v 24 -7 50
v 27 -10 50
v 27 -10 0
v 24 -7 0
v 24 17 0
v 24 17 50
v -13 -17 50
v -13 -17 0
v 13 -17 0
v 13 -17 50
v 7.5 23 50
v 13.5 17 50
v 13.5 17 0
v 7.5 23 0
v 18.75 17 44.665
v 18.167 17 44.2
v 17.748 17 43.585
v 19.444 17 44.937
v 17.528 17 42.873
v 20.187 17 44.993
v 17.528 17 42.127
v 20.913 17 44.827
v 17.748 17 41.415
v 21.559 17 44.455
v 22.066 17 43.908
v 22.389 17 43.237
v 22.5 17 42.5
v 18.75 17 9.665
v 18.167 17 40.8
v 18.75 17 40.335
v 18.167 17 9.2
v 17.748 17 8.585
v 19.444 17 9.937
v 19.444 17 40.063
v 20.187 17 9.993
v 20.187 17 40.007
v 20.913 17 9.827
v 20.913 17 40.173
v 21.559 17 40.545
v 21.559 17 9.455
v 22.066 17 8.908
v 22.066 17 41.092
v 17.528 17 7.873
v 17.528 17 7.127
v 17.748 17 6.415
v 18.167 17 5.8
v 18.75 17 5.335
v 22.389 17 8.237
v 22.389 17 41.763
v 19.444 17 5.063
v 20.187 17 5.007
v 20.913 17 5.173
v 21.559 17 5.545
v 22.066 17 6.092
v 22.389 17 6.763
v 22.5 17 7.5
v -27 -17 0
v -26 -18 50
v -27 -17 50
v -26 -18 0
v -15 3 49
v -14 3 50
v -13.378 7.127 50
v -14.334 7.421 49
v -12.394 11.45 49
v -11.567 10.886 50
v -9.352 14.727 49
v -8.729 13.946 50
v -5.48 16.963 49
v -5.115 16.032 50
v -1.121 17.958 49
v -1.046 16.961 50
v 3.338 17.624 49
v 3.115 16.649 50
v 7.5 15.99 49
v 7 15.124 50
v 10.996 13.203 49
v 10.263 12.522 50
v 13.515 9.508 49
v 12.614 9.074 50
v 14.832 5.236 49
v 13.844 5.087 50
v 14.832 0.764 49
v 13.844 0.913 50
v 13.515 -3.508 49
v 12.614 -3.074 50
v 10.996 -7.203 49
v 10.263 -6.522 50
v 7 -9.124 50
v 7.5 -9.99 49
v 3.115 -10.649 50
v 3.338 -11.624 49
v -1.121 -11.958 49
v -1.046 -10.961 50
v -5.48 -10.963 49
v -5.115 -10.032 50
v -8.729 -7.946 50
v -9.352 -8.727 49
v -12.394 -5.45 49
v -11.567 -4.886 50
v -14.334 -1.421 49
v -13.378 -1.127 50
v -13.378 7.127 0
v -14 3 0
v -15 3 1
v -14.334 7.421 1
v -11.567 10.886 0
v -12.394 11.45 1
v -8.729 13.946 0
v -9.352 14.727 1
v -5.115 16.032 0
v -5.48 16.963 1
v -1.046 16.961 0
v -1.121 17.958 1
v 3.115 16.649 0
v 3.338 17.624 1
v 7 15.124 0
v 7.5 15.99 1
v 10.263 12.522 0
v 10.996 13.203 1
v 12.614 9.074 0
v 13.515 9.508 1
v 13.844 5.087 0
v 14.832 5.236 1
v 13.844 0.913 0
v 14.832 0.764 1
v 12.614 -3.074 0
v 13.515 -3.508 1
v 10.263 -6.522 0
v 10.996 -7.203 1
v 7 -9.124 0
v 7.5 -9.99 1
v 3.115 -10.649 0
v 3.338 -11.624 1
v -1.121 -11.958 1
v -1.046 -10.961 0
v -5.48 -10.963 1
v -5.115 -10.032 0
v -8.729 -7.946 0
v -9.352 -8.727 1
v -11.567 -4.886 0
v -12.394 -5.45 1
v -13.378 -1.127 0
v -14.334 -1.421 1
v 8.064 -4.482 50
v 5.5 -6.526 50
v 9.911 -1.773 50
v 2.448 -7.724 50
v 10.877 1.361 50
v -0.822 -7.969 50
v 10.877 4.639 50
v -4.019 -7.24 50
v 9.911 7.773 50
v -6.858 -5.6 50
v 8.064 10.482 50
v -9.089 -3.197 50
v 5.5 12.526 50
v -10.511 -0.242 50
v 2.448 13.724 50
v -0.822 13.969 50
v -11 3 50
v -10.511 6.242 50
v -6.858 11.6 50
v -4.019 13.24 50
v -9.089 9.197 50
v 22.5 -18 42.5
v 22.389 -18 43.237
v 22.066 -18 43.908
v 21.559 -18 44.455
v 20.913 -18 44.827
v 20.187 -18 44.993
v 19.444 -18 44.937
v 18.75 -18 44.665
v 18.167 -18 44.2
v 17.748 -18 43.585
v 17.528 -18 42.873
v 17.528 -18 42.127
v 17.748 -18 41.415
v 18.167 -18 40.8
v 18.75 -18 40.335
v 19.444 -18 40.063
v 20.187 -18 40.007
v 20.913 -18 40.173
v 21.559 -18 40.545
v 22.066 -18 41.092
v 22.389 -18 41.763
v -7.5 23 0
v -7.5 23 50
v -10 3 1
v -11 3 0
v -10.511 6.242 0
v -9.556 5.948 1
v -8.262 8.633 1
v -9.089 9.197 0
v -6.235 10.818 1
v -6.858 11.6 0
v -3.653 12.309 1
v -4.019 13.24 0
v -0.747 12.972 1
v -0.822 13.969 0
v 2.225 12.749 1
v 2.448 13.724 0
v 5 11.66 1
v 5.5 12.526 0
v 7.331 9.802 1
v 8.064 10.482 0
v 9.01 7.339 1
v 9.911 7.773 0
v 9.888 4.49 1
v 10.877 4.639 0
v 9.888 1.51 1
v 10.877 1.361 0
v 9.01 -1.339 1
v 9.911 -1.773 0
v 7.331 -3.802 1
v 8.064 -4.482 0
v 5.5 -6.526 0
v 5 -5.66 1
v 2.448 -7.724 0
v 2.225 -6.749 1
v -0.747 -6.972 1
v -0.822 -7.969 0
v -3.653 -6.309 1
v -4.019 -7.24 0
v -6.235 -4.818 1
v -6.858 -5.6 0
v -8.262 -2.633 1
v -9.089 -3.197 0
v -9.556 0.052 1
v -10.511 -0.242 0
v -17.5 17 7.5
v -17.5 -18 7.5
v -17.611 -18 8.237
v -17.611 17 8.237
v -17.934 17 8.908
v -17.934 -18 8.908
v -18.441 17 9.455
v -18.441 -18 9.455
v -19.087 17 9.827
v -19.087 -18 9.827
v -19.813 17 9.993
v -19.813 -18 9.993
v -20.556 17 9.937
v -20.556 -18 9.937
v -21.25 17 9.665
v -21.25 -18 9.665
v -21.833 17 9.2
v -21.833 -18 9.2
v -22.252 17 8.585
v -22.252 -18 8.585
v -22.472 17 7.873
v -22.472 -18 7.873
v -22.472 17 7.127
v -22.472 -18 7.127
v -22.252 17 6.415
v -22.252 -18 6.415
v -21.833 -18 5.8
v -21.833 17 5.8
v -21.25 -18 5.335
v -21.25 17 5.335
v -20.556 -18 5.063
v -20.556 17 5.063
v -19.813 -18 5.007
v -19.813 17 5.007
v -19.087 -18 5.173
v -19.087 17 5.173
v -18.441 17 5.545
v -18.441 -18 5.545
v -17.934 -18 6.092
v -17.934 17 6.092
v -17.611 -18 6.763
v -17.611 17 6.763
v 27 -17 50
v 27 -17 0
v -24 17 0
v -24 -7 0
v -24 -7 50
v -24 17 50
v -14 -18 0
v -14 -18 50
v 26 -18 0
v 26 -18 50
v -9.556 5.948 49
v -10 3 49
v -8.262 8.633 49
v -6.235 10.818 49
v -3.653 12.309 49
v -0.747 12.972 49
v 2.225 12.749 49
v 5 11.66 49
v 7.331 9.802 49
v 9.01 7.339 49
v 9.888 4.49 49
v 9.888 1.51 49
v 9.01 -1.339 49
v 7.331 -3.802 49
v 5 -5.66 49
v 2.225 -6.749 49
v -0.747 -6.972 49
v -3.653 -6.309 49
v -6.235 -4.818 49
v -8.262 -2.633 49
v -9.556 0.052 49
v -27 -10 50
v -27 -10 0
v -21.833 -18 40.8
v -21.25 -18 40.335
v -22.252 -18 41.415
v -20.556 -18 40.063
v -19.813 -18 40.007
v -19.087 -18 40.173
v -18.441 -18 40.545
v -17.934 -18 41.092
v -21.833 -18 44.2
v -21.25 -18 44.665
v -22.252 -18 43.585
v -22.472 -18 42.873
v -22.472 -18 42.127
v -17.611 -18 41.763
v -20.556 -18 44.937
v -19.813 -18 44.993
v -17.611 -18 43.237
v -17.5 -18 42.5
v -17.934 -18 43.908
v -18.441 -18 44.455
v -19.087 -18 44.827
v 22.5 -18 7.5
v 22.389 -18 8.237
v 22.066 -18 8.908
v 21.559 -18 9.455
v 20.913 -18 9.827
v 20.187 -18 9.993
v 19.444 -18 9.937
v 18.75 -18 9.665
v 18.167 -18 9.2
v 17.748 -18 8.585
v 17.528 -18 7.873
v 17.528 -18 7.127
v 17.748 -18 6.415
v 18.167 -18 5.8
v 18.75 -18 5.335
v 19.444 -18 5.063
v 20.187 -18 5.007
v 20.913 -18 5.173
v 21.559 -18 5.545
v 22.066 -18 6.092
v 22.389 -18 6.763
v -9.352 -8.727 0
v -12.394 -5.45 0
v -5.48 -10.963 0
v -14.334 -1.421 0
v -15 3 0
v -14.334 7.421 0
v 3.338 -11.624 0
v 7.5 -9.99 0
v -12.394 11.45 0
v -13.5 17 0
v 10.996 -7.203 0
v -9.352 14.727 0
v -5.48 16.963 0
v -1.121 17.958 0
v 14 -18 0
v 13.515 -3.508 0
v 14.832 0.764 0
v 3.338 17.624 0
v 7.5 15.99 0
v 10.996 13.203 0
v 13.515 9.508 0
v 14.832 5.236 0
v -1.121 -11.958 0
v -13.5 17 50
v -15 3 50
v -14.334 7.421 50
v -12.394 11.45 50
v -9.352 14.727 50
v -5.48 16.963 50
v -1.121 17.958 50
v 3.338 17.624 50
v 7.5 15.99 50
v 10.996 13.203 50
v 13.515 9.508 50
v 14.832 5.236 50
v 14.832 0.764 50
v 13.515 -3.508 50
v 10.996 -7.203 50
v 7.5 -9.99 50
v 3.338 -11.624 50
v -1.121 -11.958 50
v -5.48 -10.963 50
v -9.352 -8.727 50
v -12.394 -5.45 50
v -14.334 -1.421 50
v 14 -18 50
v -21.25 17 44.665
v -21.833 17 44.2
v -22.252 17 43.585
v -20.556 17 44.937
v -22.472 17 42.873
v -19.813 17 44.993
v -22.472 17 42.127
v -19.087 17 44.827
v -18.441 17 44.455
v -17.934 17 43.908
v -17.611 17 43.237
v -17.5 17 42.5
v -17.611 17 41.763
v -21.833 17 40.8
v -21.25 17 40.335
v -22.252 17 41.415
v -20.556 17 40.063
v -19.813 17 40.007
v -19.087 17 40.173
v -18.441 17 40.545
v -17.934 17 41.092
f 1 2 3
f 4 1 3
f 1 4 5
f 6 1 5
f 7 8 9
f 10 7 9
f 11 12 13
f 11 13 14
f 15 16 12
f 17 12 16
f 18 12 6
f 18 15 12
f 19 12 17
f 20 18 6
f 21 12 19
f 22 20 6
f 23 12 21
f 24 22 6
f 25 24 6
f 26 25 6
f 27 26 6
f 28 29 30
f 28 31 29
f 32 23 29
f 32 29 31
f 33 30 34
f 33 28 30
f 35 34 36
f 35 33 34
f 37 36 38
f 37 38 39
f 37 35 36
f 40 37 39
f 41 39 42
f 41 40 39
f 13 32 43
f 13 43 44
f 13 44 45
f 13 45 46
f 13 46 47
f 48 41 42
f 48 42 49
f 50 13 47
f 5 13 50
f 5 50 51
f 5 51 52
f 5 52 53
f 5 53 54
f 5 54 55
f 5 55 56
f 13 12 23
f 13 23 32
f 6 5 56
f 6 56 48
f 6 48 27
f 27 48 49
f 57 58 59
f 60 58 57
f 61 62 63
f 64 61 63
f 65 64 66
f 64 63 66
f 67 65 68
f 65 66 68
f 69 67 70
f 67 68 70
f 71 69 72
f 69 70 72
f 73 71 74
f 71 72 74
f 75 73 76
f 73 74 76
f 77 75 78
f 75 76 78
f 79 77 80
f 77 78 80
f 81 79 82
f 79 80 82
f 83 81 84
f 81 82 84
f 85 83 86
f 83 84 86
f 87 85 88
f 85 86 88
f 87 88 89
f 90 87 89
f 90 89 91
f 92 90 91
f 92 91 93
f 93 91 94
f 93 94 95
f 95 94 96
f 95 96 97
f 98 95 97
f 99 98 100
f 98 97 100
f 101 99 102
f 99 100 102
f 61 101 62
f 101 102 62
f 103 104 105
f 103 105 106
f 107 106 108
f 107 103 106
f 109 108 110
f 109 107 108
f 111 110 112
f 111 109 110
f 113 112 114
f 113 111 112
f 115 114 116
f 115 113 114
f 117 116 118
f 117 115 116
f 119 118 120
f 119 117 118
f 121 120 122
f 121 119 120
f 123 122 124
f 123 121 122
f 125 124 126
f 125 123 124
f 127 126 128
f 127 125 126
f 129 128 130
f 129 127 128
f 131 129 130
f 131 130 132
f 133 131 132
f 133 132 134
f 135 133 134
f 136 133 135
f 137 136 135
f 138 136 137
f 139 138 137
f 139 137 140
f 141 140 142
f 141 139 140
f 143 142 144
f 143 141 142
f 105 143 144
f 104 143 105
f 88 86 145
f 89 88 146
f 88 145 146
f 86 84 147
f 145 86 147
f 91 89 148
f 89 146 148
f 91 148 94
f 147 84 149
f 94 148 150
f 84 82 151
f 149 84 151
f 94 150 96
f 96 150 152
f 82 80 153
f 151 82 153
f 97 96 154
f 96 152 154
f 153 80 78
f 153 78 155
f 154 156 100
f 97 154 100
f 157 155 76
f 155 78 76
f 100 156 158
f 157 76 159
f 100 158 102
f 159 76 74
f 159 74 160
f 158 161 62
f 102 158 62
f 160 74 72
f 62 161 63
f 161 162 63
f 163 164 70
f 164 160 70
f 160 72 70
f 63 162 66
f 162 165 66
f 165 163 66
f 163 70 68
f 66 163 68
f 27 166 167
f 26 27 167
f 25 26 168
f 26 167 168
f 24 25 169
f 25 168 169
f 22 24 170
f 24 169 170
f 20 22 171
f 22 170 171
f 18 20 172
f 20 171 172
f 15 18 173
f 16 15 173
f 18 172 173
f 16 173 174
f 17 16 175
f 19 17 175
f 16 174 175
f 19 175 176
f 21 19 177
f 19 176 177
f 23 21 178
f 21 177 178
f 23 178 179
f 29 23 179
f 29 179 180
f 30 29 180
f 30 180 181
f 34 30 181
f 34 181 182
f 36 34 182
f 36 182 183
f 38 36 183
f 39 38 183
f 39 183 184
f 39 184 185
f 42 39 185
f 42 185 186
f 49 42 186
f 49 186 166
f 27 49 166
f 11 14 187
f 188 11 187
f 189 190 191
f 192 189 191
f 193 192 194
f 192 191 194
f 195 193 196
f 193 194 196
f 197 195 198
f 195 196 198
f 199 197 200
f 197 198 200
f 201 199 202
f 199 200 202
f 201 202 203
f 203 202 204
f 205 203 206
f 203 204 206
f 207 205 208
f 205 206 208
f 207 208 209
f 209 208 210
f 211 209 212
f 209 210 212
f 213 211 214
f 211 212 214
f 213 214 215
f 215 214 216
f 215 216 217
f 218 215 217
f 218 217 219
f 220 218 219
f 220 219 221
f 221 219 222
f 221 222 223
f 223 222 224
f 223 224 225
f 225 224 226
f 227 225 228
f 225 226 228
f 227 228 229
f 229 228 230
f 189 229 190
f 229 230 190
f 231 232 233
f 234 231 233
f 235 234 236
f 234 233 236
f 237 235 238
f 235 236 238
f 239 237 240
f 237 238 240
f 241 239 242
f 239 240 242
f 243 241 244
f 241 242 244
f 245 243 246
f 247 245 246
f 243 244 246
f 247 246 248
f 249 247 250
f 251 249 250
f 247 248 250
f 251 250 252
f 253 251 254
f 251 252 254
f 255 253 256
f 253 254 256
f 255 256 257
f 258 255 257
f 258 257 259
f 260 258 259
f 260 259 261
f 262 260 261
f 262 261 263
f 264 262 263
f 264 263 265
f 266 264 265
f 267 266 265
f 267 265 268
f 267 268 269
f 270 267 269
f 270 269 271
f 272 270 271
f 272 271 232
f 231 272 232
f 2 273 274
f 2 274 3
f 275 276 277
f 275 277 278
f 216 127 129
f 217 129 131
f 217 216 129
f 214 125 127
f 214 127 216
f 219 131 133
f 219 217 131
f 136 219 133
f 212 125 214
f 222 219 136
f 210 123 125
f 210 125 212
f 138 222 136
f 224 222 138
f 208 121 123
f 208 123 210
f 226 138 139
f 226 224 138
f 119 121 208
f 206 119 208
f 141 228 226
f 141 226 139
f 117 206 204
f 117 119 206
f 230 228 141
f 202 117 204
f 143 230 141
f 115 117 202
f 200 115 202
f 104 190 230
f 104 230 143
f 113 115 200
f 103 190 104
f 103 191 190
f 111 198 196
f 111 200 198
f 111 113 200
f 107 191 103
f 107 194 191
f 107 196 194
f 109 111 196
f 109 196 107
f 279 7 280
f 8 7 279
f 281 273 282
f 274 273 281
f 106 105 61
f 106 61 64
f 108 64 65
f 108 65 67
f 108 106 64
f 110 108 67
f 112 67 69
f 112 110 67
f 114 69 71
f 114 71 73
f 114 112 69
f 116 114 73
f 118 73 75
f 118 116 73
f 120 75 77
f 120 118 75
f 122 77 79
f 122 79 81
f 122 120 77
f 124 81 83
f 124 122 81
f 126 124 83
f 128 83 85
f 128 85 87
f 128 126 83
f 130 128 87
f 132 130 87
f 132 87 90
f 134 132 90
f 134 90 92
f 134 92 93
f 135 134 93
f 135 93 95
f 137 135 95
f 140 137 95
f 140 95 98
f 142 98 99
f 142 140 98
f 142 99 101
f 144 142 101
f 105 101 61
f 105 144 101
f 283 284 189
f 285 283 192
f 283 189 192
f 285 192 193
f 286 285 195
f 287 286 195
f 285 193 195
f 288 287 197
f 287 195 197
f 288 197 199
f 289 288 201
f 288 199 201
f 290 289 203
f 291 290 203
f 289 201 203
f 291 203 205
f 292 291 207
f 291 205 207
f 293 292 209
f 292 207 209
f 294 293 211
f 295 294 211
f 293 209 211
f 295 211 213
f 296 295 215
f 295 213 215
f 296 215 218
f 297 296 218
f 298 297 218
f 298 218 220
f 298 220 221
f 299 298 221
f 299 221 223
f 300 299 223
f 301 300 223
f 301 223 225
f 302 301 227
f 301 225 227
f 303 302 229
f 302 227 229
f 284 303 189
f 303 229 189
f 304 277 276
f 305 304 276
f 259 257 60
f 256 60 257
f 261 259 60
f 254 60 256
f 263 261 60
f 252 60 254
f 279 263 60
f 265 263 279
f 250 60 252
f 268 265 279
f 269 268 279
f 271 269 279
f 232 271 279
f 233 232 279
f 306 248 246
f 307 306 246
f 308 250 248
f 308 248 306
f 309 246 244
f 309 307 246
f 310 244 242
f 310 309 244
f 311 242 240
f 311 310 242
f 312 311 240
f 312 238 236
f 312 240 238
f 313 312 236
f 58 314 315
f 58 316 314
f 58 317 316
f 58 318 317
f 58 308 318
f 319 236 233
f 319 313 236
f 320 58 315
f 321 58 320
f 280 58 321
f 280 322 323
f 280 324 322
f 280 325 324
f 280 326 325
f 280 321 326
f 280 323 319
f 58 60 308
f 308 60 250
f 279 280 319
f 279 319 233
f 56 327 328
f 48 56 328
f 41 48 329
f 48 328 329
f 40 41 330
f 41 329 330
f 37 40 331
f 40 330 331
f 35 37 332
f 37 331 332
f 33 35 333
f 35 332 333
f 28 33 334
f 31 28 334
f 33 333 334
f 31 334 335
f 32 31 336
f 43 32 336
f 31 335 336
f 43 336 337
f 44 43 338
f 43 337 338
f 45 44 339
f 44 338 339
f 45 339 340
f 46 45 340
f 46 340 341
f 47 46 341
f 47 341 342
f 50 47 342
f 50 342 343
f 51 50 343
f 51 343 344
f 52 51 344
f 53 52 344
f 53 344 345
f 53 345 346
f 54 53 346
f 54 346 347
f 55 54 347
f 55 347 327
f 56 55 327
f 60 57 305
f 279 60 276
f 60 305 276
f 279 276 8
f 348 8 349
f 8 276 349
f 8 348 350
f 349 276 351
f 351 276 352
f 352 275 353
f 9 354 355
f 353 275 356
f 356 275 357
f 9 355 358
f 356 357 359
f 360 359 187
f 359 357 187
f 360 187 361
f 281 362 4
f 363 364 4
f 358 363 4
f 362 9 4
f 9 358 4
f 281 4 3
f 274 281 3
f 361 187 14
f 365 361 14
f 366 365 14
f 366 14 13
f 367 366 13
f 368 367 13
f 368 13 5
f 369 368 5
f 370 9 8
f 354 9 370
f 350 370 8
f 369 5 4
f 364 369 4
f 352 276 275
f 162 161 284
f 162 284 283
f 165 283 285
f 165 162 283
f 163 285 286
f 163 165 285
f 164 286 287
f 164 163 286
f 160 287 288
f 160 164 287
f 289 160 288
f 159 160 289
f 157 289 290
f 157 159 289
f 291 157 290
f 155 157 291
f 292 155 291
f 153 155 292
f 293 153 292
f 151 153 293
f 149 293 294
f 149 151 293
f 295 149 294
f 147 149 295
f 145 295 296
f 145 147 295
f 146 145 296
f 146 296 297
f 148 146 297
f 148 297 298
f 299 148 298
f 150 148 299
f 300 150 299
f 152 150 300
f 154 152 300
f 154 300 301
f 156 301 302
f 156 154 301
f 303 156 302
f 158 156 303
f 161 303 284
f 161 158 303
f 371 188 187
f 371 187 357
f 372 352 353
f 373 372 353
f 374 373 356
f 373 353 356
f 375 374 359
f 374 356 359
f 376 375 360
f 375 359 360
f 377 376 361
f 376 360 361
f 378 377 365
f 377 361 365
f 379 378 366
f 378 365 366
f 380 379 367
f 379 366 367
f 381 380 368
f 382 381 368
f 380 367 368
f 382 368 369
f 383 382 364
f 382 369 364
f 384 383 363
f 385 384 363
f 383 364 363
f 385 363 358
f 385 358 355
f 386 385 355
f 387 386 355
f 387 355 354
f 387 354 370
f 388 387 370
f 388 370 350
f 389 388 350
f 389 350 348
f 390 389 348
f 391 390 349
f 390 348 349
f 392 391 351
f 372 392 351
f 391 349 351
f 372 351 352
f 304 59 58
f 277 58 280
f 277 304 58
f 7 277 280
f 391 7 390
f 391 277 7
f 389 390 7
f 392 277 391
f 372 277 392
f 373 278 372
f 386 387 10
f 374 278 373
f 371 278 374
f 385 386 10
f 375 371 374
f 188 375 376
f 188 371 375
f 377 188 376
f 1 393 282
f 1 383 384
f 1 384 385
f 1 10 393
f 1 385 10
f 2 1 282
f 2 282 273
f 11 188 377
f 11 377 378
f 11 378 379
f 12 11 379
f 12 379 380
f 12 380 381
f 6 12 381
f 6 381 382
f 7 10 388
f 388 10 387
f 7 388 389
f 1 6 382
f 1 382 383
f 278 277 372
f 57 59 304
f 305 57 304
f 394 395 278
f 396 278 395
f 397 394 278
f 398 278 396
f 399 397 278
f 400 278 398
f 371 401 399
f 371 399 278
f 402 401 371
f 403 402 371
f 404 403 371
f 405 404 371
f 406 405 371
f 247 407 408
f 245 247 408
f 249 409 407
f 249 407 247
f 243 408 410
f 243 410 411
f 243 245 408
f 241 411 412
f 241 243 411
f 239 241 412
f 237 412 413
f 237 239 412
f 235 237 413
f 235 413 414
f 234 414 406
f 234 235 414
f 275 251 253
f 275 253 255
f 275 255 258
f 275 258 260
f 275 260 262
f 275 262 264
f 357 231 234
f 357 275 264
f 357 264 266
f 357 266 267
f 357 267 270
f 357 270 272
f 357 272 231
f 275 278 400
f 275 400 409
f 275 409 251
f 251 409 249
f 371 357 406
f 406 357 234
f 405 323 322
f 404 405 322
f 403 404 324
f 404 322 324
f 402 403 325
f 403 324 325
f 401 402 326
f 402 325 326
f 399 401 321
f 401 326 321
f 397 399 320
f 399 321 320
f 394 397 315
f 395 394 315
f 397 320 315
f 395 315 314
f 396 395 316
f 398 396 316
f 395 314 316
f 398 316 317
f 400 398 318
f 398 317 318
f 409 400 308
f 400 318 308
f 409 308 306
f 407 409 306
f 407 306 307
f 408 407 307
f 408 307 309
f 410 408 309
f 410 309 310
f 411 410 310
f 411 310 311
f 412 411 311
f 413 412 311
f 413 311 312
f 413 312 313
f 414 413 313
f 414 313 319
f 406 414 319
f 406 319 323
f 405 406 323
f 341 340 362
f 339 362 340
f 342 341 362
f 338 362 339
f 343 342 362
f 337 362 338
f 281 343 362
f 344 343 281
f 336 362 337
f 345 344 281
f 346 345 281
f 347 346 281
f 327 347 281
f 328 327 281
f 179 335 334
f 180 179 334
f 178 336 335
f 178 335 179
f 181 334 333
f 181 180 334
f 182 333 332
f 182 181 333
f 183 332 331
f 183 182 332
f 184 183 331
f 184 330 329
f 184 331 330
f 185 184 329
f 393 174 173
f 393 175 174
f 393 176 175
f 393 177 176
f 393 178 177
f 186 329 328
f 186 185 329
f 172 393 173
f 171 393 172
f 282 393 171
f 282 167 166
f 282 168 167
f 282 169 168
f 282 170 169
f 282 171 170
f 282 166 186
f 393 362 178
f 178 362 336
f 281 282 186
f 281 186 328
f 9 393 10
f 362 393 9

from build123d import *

# Parameters (mm, degrees)
IZIM1_W                     = 48
IZIM1_H                     = 34
Y_KSEKLIK_EKSTR_ZYON1_DEPTH = 50
IZIM2_W                     = 14
IZIM2_H                     = 11
Y_KSEKLIK_EKSTR_ZYON2_DEPTH = 50
IZIM3_R                     = 15
KES_EKSTR_ZYON1_DEPTH       = 50
IZIM4_R                     = 15
IZIM4_R_2                   = 10
Y_KSEKLIK_EKSTR_ZYON3_DEPTH = 50
IZIM5_R                     = 2.5
KES_EKSTR_ZYON2_DEPTH       = 50
PAH1_SIZE                   = 1
PAH2_SIZE                   = 3
PAH3_SIZE                   = 1


with BuildPart() as part:
    # Çizim1 → Yükseklik-Ekstrüzyon1 (new body)
    with BuildSketch(Plane.XY):
        Rectangle(IZIM1_W, IZIM1_H)
    extrude(amount=Y_KSEKLIK_EKSTR_ZYON1_DEPTH)

    # Çizim2 → Yükseklik-Ekstrüzyon2 (add)
    with BuildSketch(Plane.XY.offset(50)):
        with Locations((-20, -12.5)):
            Rectangle(IZIM2_W, IZIM2_H)
        with Locations((20, -12.5)):
            Rectangle(IZIM2_W, IZIM2_H)
        Polygon((-13.5, 17), (13.5, 17), (7.5, 23), (-7.5, 23), align=None)
    extrude(amount=-Y_KSEKLIK_EKSTR_ZYON2_DEPTH)

    # Çizim3 → Kes-Ekstrüzyon1 (cut)
    with BuildSketch(Plane(origin=(0, 0, 0), x_dir=(-1, 0, 0), z_dir=(0, 0, -1))):
        with Locations((0, 3)):
            Circle(IZIM3_R)
    extrude(amount=-KES_EKSTR_ZYON1_DEPTH, mode=Mode.SUBTRACT)

    # Çizim5 → Kes-Ekstrüzyon2 (cut)
    with BuildSketch(Plane.XZ.offset(18)):
        with Locations((-20, 42.5)):
            Circle(IZIM5_R)
        with Locations((-20, 7.5)):
            Circle(IZIM5_R)
        with Locations((20, 7.5)):
            Circle(IZIM5_R)
        with Locations((20, 42.5)):
            Circle(IZIM5_R)
    extrude(amount=-KES_EKSTR_ZYON2_DEPTH, mode=Mode.SUBTRACT)

    # Pah1
    pah1_edges = [part.edges().sort_by_distance(p)[0] for p in [
        (-27, -18, 25),
        (27, -18, 25),
        (13, -18, 25),
        (-13, -18, 25),
    ]]
    chamfer(pah1_edges, length=PAH1_SIZE - 0.0001)  # a hair under: the kernel refuses the full size

    # Pah2
    pah2_edges = [part.edges().sort_by_distance(p)[0] for p in [
        (-27, -7, 25),
        (27, -7, 25),
    ]]
    chamfer(pah2_edges, length=PAH2_SIZE - 0.0001)  # a hair under: the kernel refuses the full size


with BuildPart() as body_2:
    # Çizim4 → Yükseklik-Ekstrüzyon3 (new body)
    with BuildSketch(Plane(origin=(0, 0, 0), x_dir=(-1, 0, 0), z_dir=(0, 0, -1))):
        with Locations((0, 3)):
            Circle(IZIM4_R)
        with Locations((0, 3)):
            Circle(IZIM4_R_2, mode=Mode.SUBTRACT)
    extrude(amount=-Y_KSEKLIK_EKSTR_ZYON3_DEPTH)

    # Pah3
    pah3_edges = [body_2.edges().sort_by_distance(p)[0] for p in [
        (15, 3, 0),
        (15, 3, 50),
        (10, 3, 50),
        (10, 3, 0),
    ]]
    chamfer(pah3_edges, length=PAH3_SIZE)


solid = Compound([part.part, body_2.part])
